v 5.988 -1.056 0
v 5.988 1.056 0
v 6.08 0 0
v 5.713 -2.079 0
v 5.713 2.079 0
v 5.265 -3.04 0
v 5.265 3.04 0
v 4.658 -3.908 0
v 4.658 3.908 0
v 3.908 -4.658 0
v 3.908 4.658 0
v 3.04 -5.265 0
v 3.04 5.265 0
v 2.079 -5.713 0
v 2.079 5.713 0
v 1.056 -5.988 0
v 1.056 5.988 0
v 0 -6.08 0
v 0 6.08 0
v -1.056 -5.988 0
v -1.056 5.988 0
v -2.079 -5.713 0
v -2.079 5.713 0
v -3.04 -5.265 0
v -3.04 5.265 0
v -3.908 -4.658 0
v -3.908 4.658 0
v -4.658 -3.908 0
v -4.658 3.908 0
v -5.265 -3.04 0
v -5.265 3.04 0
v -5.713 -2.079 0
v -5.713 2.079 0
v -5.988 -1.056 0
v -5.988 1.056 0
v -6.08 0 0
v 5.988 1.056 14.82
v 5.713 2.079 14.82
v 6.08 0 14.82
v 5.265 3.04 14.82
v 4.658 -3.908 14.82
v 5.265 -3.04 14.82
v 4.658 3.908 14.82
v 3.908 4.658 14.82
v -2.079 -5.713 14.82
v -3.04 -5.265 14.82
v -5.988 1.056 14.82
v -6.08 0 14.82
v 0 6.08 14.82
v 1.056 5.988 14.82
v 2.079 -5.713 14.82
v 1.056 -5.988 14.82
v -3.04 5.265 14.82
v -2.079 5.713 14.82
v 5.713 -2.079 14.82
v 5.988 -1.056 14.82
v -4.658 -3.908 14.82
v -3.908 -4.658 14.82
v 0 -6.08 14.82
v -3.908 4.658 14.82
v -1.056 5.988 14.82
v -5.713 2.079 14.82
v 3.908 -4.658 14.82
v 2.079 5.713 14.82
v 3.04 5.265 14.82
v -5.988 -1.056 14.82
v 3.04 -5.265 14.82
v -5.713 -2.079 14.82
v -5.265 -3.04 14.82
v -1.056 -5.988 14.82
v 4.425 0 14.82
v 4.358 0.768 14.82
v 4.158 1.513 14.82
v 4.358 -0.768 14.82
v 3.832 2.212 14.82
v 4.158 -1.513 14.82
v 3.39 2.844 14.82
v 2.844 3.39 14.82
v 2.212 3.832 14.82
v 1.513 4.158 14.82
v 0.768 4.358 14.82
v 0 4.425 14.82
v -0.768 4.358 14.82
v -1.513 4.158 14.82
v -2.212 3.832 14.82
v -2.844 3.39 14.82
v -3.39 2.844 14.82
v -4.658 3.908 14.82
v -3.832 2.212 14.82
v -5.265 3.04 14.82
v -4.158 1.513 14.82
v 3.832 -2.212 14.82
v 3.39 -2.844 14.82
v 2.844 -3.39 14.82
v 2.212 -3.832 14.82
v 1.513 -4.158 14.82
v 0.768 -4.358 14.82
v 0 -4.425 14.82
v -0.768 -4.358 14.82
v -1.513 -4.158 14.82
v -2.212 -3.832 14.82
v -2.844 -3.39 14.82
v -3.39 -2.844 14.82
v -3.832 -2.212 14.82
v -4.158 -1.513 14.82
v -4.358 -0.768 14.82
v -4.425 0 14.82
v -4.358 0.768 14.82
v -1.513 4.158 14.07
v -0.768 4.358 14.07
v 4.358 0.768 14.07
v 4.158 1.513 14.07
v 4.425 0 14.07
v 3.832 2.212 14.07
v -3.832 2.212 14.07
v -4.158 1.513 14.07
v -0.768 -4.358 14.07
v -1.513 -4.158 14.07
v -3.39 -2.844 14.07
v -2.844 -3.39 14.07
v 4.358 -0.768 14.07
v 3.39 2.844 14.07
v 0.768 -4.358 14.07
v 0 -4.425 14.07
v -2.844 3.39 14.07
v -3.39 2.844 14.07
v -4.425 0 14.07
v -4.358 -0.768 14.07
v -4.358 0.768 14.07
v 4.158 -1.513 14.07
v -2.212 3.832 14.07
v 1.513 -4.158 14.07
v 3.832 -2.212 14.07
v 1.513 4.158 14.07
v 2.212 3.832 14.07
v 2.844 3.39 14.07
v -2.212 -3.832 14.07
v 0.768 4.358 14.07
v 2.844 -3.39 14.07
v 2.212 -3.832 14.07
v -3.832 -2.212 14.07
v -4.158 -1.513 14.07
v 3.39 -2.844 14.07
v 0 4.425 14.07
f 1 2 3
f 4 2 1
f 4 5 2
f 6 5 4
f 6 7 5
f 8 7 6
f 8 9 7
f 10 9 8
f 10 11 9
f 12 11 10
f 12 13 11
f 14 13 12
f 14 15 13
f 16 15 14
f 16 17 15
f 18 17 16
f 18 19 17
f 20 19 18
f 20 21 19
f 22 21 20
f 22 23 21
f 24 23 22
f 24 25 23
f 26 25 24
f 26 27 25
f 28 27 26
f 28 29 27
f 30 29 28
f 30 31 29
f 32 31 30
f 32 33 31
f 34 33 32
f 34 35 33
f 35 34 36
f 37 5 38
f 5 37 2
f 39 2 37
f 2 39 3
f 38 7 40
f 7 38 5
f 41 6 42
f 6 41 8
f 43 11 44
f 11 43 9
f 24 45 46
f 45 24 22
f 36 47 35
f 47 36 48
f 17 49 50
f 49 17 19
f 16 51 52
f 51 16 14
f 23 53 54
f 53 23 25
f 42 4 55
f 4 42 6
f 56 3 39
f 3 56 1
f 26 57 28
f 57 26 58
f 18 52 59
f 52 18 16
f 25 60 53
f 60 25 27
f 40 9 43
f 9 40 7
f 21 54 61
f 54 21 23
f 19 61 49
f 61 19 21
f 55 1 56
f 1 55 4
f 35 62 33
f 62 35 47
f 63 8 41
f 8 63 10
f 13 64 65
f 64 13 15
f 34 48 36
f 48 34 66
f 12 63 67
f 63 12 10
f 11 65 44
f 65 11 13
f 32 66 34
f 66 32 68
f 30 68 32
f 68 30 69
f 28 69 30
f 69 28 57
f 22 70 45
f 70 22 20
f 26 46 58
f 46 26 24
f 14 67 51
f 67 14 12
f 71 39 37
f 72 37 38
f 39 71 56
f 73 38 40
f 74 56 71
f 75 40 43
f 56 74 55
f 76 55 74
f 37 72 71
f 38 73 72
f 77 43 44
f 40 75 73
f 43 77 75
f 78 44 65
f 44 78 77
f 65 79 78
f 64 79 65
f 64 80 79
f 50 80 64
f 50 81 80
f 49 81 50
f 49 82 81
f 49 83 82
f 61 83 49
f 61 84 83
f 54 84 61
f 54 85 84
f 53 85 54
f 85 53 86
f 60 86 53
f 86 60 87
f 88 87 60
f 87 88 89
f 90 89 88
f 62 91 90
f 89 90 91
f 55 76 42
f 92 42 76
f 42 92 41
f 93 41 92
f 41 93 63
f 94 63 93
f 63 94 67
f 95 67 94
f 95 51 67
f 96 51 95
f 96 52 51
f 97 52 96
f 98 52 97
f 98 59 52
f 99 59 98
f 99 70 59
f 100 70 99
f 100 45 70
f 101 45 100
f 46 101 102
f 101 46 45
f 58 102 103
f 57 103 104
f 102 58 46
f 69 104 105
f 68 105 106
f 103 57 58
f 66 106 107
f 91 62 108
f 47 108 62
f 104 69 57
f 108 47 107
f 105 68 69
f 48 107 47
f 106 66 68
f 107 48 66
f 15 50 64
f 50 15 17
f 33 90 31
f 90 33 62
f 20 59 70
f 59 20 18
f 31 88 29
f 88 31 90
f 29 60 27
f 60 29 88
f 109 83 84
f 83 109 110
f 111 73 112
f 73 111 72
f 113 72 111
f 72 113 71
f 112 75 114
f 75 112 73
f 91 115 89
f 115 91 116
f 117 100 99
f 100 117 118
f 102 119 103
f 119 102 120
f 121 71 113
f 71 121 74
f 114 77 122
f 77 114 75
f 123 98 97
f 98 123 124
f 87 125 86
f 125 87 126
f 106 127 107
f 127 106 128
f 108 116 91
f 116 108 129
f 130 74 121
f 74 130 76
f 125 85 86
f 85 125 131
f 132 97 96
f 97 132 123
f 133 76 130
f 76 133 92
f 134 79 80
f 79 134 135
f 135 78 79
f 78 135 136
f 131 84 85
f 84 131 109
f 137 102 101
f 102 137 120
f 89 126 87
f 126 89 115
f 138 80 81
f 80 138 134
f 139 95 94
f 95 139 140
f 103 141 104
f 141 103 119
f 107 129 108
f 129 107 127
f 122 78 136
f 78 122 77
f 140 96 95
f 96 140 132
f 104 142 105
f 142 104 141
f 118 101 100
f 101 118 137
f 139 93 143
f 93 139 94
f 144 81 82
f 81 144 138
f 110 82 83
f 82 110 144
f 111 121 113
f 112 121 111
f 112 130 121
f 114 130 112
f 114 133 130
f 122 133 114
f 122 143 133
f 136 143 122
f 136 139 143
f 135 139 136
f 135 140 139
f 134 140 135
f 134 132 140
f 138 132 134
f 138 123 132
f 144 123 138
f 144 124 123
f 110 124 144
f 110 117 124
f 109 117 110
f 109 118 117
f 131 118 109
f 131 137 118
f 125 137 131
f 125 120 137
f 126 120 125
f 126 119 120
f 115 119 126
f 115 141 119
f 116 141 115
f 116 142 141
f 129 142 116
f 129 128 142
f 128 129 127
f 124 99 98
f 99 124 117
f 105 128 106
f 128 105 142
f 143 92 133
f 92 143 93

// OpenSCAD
tolerance = 0.2;
d=12.56;
h=12.63+5.03-1.5;
rubberStickyHeight = 2.09;
rubberInset = 0.75;
adjHeight = h - (rubberStickyHeight-rubberInset);

$fn = 36;

render(convexity=2)
difference() {
    cylinder(d=12.56-2*tolerance, h=adjHeight);
    translate([0,0,adjHeight-rubberInset])
    cylinder(d=8.45+2*tolerance, h=rubberInset+1);
}
